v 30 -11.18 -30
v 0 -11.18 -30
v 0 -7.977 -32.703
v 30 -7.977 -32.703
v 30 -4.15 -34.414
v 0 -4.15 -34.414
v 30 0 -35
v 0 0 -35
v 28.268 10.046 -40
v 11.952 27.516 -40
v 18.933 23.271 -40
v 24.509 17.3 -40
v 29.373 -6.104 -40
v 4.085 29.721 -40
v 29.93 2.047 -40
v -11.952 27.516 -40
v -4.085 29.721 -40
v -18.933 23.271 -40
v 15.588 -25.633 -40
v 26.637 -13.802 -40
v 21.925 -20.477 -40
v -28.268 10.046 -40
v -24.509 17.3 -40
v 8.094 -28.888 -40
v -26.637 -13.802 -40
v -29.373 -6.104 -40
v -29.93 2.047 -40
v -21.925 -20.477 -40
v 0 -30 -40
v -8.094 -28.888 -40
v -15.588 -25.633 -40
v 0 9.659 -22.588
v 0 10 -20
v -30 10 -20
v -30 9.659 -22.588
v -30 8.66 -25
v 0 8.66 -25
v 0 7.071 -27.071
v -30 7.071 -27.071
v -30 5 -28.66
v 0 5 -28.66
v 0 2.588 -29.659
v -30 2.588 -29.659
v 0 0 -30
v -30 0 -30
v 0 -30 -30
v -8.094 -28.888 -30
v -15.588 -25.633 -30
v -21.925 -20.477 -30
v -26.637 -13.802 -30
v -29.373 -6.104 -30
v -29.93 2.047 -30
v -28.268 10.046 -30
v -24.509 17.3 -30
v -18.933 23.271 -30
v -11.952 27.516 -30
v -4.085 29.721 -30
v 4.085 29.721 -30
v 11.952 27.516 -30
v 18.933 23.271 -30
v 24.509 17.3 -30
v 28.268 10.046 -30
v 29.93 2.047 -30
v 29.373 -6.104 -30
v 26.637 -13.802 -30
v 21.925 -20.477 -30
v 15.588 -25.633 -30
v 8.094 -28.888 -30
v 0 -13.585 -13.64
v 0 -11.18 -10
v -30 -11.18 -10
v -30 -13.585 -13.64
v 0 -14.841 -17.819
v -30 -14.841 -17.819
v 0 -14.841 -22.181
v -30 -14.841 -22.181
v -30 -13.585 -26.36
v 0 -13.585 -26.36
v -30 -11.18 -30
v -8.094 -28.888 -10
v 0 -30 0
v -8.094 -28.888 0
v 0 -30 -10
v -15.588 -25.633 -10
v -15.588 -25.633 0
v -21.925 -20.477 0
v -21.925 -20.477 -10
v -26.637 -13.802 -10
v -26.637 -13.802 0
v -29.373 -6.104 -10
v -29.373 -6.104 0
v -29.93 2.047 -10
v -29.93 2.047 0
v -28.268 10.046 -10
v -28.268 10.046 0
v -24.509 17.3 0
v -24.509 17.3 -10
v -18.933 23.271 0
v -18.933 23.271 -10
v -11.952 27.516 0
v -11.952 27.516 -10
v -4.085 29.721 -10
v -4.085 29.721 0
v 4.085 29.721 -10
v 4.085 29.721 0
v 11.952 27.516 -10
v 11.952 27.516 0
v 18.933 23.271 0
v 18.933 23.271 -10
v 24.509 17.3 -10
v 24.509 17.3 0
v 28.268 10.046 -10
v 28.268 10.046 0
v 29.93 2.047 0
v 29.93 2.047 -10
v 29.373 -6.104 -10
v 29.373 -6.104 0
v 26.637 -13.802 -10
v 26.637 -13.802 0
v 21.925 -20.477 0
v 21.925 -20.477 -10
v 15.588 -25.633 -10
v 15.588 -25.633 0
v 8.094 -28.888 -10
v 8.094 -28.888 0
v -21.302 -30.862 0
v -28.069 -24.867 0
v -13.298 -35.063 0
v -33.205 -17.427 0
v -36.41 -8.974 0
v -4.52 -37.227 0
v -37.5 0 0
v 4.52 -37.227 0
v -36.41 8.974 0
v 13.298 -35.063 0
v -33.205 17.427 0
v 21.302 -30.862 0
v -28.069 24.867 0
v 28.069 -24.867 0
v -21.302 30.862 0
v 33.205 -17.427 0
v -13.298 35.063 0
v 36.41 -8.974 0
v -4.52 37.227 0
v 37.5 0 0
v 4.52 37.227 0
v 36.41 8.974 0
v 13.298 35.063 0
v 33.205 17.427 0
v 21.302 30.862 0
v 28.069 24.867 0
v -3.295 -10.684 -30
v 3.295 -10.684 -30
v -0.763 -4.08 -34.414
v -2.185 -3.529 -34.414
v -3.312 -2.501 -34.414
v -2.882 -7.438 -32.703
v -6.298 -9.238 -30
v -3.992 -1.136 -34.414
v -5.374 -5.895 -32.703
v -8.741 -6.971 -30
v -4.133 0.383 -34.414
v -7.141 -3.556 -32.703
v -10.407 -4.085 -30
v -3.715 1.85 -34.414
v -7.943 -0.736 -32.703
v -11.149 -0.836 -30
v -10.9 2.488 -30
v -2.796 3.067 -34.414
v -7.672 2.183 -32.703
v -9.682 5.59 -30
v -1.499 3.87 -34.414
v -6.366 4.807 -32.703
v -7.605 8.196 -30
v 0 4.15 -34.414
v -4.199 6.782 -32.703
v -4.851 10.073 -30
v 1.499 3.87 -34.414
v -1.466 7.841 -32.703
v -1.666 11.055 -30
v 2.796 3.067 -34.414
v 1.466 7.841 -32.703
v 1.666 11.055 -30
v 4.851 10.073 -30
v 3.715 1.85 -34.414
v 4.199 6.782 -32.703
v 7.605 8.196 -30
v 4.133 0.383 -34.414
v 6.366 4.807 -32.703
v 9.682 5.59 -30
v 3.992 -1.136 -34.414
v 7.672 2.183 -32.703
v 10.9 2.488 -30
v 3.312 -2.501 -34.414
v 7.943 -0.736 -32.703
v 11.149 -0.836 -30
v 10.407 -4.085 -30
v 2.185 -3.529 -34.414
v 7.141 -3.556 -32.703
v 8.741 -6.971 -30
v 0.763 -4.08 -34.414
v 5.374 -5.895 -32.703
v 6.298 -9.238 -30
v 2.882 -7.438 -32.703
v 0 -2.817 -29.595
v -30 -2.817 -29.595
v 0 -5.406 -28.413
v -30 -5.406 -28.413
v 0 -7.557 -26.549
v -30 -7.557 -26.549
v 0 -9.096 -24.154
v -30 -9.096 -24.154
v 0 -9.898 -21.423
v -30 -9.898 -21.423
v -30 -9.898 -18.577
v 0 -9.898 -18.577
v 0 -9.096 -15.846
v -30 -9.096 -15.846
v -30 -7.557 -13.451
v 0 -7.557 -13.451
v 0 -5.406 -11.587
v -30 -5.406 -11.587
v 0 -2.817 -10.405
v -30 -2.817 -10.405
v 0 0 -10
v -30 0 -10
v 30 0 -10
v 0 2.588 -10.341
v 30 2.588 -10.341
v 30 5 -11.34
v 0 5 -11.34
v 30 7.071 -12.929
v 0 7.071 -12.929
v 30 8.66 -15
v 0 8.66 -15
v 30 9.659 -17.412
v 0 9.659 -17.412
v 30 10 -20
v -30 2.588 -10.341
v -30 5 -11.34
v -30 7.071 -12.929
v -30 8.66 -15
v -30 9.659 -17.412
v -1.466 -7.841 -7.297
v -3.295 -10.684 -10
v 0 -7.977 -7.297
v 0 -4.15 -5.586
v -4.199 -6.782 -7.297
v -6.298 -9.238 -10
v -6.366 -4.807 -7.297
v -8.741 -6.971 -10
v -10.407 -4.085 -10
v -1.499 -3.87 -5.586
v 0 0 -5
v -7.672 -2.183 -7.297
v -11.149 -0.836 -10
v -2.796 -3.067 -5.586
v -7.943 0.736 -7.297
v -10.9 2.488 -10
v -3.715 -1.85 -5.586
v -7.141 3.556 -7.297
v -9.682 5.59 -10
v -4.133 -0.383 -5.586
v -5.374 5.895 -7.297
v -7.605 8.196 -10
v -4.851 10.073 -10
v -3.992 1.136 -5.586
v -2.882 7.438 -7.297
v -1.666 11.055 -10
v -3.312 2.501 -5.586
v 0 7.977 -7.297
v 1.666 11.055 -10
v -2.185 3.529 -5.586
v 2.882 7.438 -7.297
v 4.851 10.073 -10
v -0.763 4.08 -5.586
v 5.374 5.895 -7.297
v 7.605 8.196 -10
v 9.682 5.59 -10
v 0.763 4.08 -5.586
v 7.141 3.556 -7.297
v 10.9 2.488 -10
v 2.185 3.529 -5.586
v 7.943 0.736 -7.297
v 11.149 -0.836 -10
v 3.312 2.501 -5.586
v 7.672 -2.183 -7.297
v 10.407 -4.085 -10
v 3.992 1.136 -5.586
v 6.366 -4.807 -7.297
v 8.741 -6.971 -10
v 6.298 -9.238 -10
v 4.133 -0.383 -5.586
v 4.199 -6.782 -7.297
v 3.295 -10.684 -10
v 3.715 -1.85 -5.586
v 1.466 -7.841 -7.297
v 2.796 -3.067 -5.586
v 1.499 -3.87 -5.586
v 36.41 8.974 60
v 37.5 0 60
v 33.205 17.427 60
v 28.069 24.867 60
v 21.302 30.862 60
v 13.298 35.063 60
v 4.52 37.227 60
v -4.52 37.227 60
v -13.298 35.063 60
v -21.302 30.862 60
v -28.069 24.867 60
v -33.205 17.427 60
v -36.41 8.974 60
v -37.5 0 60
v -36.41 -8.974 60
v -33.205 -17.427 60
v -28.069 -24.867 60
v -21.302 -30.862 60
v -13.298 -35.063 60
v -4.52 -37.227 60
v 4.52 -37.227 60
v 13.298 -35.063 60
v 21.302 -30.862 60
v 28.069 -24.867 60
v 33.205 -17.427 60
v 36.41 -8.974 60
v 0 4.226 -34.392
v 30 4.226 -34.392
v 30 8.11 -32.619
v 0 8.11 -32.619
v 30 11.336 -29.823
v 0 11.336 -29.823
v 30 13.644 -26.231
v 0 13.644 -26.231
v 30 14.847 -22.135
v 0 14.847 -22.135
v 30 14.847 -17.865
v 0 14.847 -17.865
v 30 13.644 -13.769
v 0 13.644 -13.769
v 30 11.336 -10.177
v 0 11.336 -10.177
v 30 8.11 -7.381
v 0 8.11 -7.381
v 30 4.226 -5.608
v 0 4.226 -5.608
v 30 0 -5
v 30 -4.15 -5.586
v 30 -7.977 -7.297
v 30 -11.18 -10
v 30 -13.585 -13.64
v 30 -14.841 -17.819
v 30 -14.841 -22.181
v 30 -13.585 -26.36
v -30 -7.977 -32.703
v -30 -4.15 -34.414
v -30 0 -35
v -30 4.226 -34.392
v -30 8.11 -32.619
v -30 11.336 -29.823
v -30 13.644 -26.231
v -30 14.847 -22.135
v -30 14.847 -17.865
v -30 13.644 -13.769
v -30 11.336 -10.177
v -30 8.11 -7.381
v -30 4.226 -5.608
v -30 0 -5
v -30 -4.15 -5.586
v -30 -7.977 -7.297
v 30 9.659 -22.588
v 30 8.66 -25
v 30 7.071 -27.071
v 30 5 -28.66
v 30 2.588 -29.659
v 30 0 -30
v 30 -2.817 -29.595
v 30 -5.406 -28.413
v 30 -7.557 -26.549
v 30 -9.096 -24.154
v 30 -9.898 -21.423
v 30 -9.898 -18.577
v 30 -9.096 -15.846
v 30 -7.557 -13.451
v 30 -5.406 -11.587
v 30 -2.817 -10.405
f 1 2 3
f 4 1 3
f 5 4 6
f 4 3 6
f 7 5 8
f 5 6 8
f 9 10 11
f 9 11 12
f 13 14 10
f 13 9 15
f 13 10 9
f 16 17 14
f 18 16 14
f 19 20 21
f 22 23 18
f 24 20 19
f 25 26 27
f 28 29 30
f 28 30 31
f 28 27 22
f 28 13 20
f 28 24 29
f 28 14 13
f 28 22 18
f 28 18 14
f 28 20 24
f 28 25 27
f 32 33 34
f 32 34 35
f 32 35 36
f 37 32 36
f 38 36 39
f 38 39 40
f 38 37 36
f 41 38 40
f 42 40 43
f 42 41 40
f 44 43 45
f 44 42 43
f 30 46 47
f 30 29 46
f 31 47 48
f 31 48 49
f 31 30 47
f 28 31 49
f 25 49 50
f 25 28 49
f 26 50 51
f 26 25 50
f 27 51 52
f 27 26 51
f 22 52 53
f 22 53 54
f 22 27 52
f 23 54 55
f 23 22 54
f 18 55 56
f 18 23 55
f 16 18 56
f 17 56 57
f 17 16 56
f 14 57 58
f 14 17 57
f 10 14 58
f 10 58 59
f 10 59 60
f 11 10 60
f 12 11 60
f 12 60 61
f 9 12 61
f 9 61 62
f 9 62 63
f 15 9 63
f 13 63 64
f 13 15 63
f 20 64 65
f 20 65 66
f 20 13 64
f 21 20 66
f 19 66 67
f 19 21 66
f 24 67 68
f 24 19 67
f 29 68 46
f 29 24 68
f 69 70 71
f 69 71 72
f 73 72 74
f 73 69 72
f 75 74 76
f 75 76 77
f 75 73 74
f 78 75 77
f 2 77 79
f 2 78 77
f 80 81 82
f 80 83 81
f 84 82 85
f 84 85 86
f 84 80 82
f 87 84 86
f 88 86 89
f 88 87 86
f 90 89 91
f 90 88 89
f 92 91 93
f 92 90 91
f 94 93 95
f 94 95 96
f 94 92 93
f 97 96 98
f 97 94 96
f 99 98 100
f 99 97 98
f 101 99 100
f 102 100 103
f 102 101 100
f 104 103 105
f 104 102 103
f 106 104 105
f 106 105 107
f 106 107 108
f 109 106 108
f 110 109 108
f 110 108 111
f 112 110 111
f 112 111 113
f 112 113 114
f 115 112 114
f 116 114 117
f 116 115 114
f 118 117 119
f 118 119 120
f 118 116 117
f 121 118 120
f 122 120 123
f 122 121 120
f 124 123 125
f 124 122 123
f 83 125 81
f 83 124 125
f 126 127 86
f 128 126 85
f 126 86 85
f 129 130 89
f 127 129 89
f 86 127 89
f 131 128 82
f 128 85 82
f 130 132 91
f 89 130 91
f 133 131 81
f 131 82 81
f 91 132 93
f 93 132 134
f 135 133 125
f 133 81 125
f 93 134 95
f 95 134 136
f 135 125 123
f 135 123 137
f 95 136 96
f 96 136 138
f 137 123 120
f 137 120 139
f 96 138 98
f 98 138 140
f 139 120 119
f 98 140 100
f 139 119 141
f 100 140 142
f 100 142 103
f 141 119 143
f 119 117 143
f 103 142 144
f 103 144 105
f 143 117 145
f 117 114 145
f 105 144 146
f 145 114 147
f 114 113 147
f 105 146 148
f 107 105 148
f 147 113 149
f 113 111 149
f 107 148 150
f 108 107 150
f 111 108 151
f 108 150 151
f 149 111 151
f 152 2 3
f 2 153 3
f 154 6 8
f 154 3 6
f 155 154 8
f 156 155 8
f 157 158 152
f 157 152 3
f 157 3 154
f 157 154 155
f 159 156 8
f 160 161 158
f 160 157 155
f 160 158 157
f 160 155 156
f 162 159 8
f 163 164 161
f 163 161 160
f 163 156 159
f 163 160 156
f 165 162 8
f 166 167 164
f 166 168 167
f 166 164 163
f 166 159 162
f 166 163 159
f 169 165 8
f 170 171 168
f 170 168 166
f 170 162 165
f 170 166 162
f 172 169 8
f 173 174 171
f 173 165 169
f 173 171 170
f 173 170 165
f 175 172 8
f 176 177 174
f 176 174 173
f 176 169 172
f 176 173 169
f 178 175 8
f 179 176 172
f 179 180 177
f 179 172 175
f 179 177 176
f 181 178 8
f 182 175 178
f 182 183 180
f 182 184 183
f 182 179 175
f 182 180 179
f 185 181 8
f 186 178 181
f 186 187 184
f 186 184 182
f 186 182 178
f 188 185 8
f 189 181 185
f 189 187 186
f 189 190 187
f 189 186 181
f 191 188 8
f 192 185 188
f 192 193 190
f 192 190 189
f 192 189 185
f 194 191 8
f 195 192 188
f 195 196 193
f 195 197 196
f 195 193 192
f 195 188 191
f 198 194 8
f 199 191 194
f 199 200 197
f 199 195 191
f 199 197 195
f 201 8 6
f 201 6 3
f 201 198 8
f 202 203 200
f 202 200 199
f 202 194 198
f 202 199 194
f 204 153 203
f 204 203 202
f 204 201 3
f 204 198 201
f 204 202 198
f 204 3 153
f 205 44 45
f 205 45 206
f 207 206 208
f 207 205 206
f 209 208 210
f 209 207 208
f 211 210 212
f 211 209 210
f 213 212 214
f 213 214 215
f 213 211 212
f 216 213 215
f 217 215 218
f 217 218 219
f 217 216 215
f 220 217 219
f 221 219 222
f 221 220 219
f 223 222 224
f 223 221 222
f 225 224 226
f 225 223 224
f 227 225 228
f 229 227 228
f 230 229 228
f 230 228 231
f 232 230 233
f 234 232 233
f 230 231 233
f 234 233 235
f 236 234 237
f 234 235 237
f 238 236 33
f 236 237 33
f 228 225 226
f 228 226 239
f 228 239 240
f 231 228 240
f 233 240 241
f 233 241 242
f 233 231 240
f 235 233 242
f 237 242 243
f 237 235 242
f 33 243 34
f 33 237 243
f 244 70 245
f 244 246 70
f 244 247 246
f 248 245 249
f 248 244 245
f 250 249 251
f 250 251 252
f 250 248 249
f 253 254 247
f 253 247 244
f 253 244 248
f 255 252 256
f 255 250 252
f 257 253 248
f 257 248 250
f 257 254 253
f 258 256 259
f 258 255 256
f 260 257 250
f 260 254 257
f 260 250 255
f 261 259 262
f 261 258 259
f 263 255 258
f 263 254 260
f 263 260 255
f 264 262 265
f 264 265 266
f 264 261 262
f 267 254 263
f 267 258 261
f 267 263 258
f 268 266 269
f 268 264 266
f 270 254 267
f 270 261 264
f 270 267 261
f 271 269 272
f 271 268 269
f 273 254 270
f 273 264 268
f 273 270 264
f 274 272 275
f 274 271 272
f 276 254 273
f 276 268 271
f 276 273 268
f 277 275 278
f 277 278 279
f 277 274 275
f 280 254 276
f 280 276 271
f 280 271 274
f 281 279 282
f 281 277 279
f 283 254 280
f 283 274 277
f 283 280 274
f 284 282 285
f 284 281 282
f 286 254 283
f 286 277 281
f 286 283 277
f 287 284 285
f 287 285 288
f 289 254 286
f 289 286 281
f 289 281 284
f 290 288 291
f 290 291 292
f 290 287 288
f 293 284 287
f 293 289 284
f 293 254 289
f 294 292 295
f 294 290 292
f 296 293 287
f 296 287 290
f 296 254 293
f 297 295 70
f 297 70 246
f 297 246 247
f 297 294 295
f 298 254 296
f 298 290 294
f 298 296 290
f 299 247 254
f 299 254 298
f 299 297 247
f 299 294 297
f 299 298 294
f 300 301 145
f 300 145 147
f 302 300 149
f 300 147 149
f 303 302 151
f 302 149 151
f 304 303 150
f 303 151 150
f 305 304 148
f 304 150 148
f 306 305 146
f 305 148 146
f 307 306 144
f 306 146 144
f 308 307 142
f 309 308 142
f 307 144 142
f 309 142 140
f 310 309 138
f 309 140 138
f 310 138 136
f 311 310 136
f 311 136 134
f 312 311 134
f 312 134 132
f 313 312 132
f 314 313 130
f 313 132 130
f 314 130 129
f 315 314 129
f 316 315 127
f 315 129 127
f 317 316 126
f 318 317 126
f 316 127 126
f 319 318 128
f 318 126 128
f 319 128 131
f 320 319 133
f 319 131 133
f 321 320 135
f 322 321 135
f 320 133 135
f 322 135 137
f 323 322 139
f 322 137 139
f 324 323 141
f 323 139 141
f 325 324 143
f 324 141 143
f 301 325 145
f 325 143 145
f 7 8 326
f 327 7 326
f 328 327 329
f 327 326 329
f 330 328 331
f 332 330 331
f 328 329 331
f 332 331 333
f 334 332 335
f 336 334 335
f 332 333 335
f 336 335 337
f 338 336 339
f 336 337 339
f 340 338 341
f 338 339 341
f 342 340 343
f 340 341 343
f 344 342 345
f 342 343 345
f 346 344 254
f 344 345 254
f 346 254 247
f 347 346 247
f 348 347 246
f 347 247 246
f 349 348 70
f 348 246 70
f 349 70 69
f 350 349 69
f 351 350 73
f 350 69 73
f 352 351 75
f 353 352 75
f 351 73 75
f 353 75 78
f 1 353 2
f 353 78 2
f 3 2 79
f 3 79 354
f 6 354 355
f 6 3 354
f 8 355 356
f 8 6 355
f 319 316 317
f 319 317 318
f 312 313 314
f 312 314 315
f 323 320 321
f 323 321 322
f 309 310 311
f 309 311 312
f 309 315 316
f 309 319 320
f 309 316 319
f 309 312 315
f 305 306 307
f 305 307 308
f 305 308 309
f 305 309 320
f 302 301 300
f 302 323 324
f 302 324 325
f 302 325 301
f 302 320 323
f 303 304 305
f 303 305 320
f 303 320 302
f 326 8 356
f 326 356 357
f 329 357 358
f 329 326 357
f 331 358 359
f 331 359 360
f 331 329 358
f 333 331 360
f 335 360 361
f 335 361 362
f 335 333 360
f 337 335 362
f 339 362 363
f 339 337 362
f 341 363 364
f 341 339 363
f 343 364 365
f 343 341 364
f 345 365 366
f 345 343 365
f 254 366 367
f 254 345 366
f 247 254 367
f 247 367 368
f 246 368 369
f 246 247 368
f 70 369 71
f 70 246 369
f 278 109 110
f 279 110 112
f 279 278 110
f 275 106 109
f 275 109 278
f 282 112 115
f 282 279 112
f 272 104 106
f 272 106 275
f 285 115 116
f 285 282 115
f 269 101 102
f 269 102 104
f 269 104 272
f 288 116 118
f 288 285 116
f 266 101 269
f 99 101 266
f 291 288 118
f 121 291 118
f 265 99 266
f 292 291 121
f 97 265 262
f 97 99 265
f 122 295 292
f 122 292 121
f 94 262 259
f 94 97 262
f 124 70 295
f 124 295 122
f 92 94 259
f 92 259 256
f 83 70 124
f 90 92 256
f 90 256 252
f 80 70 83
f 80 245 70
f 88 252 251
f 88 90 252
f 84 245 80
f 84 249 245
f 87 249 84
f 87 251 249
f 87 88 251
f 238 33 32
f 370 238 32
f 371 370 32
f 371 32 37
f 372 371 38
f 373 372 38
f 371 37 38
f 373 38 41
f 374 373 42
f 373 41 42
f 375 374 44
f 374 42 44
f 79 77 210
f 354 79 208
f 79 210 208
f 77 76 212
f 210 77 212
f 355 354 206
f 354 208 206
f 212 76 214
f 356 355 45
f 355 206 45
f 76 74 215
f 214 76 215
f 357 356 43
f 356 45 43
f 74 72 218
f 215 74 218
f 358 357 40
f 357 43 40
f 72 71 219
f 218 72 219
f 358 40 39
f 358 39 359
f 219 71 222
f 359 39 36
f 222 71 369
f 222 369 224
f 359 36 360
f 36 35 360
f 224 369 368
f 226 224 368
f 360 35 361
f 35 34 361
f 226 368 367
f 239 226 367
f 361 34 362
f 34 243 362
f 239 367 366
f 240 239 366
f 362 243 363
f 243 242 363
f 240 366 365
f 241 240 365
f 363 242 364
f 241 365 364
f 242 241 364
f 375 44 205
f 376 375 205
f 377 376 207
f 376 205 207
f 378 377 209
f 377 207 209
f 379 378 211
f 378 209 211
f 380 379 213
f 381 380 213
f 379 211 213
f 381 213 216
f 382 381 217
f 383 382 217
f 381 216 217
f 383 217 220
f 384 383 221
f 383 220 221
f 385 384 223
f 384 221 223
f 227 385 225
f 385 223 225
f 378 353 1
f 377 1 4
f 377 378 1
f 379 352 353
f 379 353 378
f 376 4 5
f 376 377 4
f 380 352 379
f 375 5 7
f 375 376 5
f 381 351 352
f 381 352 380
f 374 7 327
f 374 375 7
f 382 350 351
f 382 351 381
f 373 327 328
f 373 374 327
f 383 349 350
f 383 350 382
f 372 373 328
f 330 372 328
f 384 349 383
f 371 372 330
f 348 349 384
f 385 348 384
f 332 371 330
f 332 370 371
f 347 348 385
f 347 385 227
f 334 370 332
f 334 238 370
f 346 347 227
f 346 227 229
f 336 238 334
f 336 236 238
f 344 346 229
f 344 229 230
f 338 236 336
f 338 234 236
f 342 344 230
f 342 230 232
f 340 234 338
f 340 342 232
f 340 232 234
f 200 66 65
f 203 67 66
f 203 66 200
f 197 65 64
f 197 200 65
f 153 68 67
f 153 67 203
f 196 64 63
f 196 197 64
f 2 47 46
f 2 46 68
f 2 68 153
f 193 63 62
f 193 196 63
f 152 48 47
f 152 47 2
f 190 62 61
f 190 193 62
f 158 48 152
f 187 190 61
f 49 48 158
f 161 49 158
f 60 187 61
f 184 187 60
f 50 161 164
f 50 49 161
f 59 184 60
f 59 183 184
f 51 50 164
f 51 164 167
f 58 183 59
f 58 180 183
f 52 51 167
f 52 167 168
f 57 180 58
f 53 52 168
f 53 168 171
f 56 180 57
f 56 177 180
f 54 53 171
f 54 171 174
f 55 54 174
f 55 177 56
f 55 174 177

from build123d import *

# Parameters (mm, degrees)
F0_R          = 37.5
F0_R_2        = 32.4999988079
F1_DEPTH      = 60
F4_DEPTH      = 30
F4_DEPTH_BACK = 30


with BuildPart() as f1:
    # F0 (on Top) → F1 (new body)
    with BuildSketch(Plane.XY):
        Circle(F0_R)
        Circle(F0_R_2, mode=Mode.SUBTRACT)
        Circle(F0_R_2)
    extrude(amount=F1_DEPTH)

    # F2 (on Right) → F3 (revolve)
    with BuildSketch(Plane.YZ):
        with BuildLine():
            ThreePointArc((-11.1803398875, -10), (-6.123724357, -6.3069360624), (0, -5))
            Line((0, -5), (0, 0))
            Line((0, 0), (-30, 0))
            Line((-30, 0), (-30, -10))
            Line((-30, -10), (-11.1803398875, -10))
        make_face()
    revolve(axis=Axis((0, 0, -10), (0, 0, -1)))


with BuildPart() as f3:
    # F2 (on Right) → F3, piece 2 (revolve)
    with BuildSketch(Plane.YZ):
        with BuildLine():
            Line((0, -40), (0, -35))
            ThreePointArc((0, -35), (-6.123724357, -33.6930639376), (-11.1803398875, -30))
            Line((-11.1803398875, -30), (-30, -30))
            Line((-30, -30), (-30, -40))
            Line((-30, -40), (0, -40))
        make_face()
    revolve(axis=Axis((0, 0, -10), (0, 0, -1)))


with BuildPart() as f4:
    # F2 (on Right) → F4 (new body, two sides)
    with BuildSketch(Plane.YZ) as f4_sk:
        with BuildLine():
            Line((-11.1803398875, -10), (0, -10))
            Line((0, -10), (0, -5))
            ThreePointArc((0, -5), (-6.123724357, -6.3069360624), (-11.1803398875, -10))
        make_face()
        with BuildLine():
            ThreePointArc((0, -30), (-10, -20), (0, -10))
            Line((0, -10), (-11.1803398875, -10))
            ThreePointArc((-11.1803398875, -10), (-15, -20), (-11.1803398875, -30))
            Line((-11.1803398875, -30), (0, -30))
        make_face()
        with BuildLine():
            Line((0, -35), (0, -30))
            Line((0, -30), (-11.1803398875, -30))
            ThreePointArc((-11.1803398875, -30), (-6.123724357, -33.6930639376), (0, -35))
        make_face()
        with BuildLine():
            Line((0, -5), (0, -10))
            ThreePointArc((0, -10), (7.0710678119, -12.9289321881), (10, -20))
            ThreePointArc((10, -20), (7.0710678119, -27.0710678119), (0, -30))
            Line((0, -30), (0, -35))
            ThreePointArc((0, -35), (10.6066017178, -30.6066017178), (15, -20))
            ThreePointArc((15, -20), (10.6066017178, -9.3933982822), (0, -5))
        make_face()
    extrude(amount=F4_DEPTH)
    extrude(f4_sk.sketch, amount=-F4_DEPTH_BACK)


solid = Compound([f1.part, f3.part, f4.part])
